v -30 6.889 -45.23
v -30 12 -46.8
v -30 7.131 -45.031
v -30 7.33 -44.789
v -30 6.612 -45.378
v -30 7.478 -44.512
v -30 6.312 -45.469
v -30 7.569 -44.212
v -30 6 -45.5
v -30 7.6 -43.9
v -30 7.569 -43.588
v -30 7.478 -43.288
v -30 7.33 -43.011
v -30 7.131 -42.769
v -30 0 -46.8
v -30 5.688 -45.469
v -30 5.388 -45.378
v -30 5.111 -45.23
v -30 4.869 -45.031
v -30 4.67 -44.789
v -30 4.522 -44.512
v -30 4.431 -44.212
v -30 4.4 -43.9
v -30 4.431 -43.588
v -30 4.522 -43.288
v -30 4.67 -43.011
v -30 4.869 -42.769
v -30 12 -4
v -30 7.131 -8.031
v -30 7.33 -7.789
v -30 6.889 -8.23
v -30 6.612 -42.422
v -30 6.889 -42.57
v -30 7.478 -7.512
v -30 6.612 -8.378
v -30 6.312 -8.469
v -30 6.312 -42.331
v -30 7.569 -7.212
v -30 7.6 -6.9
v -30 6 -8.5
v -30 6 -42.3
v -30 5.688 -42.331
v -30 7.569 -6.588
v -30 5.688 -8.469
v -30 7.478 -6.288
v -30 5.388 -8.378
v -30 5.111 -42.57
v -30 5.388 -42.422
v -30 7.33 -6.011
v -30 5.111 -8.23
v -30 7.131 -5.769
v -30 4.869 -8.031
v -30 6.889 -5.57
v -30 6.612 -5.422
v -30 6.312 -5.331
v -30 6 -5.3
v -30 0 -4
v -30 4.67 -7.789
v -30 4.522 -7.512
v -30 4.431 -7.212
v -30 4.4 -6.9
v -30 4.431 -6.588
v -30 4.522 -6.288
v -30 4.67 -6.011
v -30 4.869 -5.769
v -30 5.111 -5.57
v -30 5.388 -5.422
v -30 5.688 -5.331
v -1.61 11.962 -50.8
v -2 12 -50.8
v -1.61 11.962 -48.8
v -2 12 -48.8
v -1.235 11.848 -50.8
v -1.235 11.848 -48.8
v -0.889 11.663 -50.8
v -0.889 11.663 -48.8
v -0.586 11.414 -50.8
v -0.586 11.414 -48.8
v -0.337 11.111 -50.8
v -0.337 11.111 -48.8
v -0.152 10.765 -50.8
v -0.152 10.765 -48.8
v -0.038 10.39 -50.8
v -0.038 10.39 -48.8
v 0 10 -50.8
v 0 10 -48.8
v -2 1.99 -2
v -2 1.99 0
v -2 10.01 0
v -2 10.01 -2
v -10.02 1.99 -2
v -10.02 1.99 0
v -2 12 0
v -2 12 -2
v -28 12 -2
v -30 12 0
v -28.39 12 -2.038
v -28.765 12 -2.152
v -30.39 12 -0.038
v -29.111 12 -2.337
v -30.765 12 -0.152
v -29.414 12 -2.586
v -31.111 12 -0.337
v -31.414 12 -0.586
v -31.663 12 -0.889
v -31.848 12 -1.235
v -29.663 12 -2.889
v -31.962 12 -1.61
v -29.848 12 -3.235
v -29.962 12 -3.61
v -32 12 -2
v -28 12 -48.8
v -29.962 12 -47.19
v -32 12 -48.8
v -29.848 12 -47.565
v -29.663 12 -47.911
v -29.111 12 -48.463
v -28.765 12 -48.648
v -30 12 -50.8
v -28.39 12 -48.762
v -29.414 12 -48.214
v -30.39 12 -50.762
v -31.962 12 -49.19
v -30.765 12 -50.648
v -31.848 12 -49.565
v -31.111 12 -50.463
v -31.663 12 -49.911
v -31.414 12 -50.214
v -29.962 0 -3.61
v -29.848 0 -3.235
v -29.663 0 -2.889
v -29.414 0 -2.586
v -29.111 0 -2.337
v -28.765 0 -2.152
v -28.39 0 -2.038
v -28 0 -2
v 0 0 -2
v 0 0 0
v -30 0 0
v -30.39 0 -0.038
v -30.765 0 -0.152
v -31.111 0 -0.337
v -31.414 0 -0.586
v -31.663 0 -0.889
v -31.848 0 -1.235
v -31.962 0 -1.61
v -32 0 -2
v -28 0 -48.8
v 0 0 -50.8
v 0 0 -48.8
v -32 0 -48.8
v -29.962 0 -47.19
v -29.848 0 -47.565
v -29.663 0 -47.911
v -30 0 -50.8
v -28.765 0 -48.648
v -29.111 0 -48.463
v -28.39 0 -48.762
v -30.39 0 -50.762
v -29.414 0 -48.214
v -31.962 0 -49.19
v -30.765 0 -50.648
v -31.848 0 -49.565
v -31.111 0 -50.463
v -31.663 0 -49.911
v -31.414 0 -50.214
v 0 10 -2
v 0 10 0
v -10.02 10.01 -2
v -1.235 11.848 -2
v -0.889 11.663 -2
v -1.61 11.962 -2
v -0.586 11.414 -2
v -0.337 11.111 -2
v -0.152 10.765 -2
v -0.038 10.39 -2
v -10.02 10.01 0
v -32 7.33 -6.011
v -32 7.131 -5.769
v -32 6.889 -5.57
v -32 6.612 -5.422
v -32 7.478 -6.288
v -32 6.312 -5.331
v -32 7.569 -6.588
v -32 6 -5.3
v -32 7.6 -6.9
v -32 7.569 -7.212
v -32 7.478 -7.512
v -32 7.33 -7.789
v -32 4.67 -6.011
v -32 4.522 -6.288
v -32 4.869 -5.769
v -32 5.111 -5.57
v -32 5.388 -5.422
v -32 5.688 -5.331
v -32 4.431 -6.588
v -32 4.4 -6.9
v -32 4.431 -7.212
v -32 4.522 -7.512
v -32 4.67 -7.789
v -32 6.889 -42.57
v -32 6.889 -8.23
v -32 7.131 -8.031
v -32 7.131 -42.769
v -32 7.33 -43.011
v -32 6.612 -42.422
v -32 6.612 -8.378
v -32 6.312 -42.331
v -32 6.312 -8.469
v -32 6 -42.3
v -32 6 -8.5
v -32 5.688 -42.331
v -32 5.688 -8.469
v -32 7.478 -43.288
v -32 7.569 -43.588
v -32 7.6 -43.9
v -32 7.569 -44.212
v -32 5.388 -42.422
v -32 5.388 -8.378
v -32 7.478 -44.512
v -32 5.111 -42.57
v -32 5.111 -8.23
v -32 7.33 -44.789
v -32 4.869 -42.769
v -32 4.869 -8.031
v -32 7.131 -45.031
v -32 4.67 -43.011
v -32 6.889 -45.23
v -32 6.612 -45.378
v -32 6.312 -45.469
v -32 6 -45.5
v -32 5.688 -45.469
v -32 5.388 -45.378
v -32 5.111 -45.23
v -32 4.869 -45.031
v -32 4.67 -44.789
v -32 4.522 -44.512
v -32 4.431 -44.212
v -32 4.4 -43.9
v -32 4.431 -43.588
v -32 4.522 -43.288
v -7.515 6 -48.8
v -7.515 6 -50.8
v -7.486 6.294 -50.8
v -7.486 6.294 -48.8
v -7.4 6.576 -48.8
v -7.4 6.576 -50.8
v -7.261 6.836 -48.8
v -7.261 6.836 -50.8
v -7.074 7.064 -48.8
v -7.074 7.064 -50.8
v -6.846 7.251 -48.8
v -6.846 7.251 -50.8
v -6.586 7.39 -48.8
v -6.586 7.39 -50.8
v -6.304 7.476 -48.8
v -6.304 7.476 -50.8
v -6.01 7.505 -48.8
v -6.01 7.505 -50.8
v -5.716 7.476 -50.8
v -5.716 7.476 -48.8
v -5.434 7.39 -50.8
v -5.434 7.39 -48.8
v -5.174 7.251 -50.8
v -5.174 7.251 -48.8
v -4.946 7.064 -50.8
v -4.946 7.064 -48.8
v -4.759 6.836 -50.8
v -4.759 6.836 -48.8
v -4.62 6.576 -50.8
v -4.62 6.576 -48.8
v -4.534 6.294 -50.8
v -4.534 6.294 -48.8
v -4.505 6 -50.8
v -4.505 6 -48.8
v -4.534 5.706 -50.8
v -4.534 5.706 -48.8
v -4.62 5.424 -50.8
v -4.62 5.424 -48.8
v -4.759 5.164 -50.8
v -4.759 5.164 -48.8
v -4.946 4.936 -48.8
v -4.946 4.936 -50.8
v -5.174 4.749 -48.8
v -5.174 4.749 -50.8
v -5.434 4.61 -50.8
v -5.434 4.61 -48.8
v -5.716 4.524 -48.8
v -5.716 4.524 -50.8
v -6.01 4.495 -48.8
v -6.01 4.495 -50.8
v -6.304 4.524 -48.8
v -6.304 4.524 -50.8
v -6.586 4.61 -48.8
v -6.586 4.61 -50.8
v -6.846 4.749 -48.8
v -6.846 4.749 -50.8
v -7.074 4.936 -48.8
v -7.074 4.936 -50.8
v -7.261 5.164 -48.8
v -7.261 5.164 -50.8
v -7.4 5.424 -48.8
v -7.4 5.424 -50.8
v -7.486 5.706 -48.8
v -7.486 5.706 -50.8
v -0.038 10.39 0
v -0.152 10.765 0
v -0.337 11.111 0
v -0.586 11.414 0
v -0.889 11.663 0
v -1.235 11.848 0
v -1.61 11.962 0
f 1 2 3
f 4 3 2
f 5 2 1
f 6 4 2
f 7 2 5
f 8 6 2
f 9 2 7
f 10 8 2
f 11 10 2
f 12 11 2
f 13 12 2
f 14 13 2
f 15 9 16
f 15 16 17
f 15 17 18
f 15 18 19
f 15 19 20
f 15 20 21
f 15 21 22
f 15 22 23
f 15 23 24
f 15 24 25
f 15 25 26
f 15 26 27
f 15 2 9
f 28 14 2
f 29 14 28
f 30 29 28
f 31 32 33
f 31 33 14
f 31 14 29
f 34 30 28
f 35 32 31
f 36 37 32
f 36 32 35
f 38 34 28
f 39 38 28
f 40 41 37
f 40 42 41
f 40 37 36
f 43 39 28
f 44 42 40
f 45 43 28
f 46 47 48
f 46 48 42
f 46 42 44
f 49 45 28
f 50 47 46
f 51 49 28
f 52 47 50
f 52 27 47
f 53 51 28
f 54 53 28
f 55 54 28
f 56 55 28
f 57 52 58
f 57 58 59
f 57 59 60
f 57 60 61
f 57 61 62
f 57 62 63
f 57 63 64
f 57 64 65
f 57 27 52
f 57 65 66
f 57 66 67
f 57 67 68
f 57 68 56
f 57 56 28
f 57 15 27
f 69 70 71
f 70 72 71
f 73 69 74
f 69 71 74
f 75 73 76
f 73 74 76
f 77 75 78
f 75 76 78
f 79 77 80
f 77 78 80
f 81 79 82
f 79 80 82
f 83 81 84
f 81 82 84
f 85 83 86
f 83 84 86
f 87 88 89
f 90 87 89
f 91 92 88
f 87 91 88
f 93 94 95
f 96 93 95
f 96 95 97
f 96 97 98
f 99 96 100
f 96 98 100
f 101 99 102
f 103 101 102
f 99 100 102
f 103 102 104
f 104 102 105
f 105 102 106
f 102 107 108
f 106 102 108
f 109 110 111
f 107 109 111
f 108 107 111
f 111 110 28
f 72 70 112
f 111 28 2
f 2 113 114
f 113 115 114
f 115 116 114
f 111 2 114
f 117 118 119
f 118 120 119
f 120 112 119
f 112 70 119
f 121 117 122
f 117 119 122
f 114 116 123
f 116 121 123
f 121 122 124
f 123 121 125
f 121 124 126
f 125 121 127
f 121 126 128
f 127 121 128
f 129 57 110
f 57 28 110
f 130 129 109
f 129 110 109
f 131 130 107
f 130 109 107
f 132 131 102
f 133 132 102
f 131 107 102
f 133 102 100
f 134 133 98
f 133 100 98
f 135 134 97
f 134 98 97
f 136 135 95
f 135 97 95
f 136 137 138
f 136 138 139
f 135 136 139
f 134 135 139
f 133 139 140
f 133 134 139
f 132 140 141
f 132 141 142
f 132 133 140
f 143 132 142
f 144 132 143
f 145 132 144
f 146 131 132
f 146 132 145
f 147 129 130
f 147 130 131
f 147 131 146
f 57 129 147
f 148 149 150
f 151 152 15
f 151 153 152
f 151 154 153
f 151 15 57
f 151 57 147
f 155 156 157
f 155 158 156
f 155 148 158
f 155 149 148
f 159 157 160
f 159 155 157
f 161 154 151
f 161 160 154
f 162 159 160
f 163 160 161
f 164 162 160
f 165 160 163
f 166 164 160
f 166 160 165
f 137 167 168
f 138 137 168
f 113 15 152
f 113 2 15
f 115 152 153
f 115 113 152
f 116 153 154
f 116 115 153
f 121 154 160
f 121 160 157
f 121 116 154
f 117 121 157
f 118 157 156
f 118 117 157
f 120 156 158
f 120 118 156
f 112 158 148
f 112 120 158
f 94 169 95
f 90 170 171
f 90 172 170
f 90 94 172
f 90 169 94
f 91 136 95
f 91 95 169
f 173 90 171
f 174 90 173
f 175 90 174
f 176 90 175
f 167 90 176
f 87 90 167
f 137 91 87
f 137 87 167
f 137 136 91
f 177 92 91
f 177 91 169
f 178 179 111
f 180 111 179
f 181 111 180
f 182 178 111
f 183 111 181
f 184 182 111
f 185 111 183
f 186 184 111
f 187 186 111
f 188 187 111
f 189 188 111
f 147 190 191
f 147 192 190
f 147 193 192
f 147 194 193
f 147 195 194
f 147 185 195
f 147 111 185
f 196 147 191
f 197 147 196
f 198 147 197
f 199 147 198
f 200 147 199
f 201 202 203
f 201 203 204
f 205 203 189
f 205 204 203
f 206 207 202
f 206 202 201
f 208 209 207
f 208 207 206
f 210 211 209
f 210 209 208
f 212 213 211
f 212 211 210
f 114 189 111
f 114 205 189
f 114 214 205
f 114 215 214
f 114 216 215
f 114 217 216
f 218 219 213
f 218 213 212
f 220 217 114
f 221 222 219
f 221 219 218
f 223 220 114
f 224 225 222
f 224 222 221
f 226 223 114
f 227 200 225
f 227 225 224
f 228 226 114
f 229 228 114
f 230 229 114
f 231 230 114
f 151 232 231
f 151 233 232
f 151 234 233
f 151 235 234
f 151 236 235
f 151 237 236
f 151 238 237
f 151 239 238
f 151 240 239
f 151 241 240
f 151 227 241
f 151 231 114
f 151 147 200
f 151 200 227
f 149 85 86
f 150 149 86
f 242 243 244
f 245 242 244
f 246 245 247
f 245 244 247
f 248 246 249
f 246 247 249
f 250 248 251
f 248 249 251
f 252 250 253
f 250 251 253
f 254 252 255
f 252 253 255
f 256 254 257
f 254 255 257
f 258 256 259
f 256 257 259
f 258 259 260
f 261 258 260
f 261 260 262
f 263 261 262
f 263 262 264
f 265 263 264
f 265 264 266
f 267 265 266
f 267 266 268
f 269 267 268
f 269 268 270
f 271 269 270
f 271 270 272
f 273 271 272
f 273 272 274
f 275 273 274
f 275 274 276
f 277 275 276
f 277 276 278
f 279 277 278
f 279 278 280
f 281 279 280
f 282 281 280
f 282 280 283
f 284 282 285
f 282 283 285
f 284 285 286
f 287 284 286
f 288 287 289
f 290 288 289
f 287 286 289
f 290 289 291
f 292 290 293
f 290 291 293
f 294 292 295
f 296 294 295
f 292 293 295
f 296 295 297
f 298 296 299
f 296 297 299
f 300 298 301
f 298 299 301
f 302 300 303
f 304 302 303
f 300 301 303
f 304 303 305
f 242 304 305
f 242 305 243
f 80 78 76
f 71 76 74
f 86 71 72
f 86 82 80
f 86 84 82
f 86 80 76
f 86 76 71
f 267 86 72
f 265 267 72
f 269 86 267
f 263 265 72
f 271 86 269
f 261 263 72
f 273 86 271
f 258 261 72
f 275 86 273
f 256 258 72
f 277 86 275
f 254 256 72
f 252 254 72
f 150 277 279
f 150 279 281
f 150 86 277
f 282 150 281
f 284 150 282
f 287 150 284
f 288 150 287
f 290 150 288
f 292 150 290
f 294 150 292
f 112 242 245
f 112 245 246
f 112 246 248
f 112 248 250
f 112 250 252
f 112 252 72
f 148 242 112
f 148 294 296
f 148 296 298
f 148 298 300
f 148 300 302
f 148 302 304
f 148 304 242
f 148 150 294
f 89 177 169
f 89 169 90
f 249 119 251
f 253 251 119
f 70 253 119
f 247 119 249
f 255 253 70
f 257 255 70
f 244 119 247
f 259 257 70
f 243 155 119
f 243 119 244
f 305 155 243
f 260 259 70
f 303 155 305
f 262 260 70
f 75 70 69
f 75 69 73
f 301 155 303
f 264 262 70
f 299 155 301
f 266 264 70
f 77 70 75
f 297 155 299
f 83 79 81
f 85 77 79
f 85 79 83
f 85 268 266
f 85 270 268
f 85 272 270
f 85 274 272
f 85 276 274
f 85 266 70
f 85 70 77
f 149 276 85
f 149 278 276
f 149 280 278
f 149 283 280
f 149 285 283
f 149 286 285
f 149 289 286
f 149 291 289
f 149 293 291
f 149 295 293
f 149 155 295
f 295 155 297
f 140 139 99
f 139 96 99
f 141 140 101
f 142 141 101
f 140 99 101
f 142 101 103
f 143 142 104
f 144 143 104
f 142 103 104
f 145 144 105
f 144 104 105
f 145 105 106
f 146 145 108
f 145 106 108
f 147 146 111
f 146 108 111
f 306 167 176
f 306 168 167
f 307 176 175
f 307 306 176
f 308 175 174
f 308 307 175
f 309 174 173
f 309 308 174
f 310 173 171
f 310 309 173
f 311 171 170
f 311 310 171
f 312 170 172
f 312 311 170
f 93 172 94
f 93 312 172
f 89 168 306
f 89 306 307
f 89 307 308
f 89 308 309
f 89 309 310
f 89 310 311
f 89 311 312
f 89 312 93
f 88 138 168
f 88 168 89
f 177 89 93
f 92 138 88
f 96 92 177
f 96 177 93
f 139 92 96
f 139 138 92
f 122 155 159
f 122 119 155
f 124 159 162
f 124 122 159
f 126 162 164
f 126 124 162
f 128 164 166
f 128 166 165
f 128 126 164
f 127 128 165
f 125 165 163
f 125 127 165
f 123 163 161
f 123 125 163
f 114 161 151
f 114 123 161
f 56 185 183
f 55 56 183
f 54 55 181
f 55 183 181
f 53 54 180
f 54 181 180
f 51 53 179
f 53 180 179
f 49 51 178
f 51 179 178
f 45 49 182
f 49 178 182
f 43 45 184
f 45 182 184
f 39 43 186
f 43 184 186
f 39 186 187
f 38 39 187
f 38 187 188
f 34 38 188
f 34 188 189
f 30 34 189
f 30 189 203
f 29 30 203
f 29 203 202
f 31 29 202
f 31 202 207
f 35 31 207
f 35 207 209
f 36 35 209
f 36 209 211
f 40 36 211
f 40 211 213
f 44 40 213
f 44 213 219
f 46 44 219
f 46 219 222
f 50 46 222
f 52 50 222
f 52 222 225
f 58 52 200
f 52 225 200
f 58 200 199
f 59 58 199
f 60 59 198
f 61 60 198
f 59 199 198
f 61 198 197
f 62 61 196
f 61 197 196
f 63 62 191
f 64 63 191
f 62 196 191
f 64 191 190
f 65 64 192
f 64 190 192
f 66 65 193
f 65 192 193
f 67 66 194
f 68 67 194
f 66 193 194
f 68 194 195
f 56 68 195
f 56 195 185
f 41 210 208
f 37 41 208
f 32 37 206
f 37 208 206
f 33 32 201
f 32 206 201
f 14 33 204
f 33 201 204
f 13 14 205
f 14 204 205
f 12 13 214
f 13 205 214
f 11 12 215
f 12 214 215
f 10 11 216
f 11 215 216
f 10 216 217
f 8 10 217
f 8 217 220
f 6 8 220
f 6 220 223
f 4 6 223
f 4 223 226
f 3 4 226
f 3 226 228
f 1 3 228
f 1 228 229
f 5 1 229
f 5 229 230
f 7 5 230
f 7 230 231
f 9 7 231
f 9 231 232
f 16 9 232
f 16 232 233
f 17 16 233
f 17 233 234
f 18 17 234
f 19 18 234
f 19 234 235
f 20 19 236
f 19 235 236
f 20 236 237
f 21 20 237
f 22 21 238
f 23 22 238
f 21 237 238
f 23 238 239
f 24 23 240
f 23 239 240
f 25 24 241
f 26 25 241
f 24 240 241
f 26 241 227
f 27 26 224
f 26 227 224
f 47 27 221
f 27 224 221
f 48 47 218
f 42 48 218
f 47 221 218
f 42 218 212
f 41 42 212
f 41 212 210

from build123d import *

# Parameters (mm, degrees)
BOSS_EXTRUDE1_DEPTH = 12
SKETCH3_R           = 1.505
CUT_EXTRUDE2_DEPTH  = 4
SKETCH5_R           = 1.6
CUT_EXTRUDE3_DEPTH  = 4
SKETCH6_W           = 8.02
SKETCH6_H           = 8.02
CUT_EXTRUDE4_DEPTH  = 2
FILLET1_R           = 2
FILLET2_R           = 2
FILLET3_R           = 2
FILLET4_R           = 2
FILLET5_R           = 2
FILLET6_R           = 2


with BuildPart() as part:
    # Sketch1 → Boss-Extrude1 (new body)
    with BuildSketch(Plane(origin=(0, 0, 0), x_dir=(1, 0, 0), z_dir=(0, 1, 0))):
        Polygon((0, 0), (-32, 0), (-32, 50.8), (0, 50.8), (0, 48.8), (-30, 48.8), (-30, 2), (0, 2), align=None)
    extrude(amount=BOSS_EXTRUDE1_DEPTH)

    # Sketch3 → Cut-Extrude2 (cut)
    with BuildSketch(Plane(origin=(0, 0, -50.8), x_dir=(-1, 0, 0), z_dir=(0, 0, -1))):
        with Locations((6.01, 6)):
            Circle(SKETCH3_R)
    extrude(amount=-CUT_EXTRUDE2_DEPTH, mode=Mode.SUBTRACT)

    # Sketch5 → Cut-Extrude3 (cut)
    with BuildSketch(Plane.ZY.offset(32)):
        with Locations((-43.9, 6)):
            Circle(SKETCH5_R)
        with Locations((-6.9, 6)):
            Circle(SKETCH5_R)
    extrude(amount=-CUT_EXTRUDE3_DEPTH, mode=Mode.SUBTRACT)

    # Sketch6 → Cut-Extrude4 (cut)
    with BuildSketch(Plane.XY):
        with Locations((-6.01, 6)):
            Rectangle(SKETCH6_W, SKETCH6_H)
    extrude(amount=-CUT_EXTRUDE4_DEPTH, mode=Mode.SUBTRACT)

    # Fillet1
    fillet1_edges = [part.edges().sort_by_distance(p)[0] for p in [
        (0, 12, -1),
    ]]
    fillet(fillet1_edges, radius=FILLET1_R)

    # Fillet2
    fillet2_edges = [part.edges().sort_by_distance(p)[0] for p in [
        (0, 12, -49.8),
    ]]
    fillet(fillet2_edges, radius=FILLET2_R)

    # Fillet3
    fillet3_edges = [part.edges().sort_by_distance(p)[0] for p in [
        (-30, 6, -2),
    ]]
    fillet(fillet3_edges, radius=FILLET3_R)

    # Fillet4
    fillet4_edges = [part.edges().sort_by_distance(p)[0] for p in [
        (-32, 6, 0),
    ]]
    fillet(fillet4_edges, radius=FILLET4_R)

    # Fillet5
    fillet5_edges = [part.edges().sort_by_distance(p)[0] for p in [
        (-30, 6, -48.8),
    ]]
    fillet(fillet5_edges, radius=FILLET5_R)

    # Fillet6
    fillet6_edges = [part.edges().sort_by_distance(p)[0] for p in [
        (-32, 6, -50.8),
    ]]
    fillet(fillet6_edges, radius=FILLET6_R)


solid = part.part
